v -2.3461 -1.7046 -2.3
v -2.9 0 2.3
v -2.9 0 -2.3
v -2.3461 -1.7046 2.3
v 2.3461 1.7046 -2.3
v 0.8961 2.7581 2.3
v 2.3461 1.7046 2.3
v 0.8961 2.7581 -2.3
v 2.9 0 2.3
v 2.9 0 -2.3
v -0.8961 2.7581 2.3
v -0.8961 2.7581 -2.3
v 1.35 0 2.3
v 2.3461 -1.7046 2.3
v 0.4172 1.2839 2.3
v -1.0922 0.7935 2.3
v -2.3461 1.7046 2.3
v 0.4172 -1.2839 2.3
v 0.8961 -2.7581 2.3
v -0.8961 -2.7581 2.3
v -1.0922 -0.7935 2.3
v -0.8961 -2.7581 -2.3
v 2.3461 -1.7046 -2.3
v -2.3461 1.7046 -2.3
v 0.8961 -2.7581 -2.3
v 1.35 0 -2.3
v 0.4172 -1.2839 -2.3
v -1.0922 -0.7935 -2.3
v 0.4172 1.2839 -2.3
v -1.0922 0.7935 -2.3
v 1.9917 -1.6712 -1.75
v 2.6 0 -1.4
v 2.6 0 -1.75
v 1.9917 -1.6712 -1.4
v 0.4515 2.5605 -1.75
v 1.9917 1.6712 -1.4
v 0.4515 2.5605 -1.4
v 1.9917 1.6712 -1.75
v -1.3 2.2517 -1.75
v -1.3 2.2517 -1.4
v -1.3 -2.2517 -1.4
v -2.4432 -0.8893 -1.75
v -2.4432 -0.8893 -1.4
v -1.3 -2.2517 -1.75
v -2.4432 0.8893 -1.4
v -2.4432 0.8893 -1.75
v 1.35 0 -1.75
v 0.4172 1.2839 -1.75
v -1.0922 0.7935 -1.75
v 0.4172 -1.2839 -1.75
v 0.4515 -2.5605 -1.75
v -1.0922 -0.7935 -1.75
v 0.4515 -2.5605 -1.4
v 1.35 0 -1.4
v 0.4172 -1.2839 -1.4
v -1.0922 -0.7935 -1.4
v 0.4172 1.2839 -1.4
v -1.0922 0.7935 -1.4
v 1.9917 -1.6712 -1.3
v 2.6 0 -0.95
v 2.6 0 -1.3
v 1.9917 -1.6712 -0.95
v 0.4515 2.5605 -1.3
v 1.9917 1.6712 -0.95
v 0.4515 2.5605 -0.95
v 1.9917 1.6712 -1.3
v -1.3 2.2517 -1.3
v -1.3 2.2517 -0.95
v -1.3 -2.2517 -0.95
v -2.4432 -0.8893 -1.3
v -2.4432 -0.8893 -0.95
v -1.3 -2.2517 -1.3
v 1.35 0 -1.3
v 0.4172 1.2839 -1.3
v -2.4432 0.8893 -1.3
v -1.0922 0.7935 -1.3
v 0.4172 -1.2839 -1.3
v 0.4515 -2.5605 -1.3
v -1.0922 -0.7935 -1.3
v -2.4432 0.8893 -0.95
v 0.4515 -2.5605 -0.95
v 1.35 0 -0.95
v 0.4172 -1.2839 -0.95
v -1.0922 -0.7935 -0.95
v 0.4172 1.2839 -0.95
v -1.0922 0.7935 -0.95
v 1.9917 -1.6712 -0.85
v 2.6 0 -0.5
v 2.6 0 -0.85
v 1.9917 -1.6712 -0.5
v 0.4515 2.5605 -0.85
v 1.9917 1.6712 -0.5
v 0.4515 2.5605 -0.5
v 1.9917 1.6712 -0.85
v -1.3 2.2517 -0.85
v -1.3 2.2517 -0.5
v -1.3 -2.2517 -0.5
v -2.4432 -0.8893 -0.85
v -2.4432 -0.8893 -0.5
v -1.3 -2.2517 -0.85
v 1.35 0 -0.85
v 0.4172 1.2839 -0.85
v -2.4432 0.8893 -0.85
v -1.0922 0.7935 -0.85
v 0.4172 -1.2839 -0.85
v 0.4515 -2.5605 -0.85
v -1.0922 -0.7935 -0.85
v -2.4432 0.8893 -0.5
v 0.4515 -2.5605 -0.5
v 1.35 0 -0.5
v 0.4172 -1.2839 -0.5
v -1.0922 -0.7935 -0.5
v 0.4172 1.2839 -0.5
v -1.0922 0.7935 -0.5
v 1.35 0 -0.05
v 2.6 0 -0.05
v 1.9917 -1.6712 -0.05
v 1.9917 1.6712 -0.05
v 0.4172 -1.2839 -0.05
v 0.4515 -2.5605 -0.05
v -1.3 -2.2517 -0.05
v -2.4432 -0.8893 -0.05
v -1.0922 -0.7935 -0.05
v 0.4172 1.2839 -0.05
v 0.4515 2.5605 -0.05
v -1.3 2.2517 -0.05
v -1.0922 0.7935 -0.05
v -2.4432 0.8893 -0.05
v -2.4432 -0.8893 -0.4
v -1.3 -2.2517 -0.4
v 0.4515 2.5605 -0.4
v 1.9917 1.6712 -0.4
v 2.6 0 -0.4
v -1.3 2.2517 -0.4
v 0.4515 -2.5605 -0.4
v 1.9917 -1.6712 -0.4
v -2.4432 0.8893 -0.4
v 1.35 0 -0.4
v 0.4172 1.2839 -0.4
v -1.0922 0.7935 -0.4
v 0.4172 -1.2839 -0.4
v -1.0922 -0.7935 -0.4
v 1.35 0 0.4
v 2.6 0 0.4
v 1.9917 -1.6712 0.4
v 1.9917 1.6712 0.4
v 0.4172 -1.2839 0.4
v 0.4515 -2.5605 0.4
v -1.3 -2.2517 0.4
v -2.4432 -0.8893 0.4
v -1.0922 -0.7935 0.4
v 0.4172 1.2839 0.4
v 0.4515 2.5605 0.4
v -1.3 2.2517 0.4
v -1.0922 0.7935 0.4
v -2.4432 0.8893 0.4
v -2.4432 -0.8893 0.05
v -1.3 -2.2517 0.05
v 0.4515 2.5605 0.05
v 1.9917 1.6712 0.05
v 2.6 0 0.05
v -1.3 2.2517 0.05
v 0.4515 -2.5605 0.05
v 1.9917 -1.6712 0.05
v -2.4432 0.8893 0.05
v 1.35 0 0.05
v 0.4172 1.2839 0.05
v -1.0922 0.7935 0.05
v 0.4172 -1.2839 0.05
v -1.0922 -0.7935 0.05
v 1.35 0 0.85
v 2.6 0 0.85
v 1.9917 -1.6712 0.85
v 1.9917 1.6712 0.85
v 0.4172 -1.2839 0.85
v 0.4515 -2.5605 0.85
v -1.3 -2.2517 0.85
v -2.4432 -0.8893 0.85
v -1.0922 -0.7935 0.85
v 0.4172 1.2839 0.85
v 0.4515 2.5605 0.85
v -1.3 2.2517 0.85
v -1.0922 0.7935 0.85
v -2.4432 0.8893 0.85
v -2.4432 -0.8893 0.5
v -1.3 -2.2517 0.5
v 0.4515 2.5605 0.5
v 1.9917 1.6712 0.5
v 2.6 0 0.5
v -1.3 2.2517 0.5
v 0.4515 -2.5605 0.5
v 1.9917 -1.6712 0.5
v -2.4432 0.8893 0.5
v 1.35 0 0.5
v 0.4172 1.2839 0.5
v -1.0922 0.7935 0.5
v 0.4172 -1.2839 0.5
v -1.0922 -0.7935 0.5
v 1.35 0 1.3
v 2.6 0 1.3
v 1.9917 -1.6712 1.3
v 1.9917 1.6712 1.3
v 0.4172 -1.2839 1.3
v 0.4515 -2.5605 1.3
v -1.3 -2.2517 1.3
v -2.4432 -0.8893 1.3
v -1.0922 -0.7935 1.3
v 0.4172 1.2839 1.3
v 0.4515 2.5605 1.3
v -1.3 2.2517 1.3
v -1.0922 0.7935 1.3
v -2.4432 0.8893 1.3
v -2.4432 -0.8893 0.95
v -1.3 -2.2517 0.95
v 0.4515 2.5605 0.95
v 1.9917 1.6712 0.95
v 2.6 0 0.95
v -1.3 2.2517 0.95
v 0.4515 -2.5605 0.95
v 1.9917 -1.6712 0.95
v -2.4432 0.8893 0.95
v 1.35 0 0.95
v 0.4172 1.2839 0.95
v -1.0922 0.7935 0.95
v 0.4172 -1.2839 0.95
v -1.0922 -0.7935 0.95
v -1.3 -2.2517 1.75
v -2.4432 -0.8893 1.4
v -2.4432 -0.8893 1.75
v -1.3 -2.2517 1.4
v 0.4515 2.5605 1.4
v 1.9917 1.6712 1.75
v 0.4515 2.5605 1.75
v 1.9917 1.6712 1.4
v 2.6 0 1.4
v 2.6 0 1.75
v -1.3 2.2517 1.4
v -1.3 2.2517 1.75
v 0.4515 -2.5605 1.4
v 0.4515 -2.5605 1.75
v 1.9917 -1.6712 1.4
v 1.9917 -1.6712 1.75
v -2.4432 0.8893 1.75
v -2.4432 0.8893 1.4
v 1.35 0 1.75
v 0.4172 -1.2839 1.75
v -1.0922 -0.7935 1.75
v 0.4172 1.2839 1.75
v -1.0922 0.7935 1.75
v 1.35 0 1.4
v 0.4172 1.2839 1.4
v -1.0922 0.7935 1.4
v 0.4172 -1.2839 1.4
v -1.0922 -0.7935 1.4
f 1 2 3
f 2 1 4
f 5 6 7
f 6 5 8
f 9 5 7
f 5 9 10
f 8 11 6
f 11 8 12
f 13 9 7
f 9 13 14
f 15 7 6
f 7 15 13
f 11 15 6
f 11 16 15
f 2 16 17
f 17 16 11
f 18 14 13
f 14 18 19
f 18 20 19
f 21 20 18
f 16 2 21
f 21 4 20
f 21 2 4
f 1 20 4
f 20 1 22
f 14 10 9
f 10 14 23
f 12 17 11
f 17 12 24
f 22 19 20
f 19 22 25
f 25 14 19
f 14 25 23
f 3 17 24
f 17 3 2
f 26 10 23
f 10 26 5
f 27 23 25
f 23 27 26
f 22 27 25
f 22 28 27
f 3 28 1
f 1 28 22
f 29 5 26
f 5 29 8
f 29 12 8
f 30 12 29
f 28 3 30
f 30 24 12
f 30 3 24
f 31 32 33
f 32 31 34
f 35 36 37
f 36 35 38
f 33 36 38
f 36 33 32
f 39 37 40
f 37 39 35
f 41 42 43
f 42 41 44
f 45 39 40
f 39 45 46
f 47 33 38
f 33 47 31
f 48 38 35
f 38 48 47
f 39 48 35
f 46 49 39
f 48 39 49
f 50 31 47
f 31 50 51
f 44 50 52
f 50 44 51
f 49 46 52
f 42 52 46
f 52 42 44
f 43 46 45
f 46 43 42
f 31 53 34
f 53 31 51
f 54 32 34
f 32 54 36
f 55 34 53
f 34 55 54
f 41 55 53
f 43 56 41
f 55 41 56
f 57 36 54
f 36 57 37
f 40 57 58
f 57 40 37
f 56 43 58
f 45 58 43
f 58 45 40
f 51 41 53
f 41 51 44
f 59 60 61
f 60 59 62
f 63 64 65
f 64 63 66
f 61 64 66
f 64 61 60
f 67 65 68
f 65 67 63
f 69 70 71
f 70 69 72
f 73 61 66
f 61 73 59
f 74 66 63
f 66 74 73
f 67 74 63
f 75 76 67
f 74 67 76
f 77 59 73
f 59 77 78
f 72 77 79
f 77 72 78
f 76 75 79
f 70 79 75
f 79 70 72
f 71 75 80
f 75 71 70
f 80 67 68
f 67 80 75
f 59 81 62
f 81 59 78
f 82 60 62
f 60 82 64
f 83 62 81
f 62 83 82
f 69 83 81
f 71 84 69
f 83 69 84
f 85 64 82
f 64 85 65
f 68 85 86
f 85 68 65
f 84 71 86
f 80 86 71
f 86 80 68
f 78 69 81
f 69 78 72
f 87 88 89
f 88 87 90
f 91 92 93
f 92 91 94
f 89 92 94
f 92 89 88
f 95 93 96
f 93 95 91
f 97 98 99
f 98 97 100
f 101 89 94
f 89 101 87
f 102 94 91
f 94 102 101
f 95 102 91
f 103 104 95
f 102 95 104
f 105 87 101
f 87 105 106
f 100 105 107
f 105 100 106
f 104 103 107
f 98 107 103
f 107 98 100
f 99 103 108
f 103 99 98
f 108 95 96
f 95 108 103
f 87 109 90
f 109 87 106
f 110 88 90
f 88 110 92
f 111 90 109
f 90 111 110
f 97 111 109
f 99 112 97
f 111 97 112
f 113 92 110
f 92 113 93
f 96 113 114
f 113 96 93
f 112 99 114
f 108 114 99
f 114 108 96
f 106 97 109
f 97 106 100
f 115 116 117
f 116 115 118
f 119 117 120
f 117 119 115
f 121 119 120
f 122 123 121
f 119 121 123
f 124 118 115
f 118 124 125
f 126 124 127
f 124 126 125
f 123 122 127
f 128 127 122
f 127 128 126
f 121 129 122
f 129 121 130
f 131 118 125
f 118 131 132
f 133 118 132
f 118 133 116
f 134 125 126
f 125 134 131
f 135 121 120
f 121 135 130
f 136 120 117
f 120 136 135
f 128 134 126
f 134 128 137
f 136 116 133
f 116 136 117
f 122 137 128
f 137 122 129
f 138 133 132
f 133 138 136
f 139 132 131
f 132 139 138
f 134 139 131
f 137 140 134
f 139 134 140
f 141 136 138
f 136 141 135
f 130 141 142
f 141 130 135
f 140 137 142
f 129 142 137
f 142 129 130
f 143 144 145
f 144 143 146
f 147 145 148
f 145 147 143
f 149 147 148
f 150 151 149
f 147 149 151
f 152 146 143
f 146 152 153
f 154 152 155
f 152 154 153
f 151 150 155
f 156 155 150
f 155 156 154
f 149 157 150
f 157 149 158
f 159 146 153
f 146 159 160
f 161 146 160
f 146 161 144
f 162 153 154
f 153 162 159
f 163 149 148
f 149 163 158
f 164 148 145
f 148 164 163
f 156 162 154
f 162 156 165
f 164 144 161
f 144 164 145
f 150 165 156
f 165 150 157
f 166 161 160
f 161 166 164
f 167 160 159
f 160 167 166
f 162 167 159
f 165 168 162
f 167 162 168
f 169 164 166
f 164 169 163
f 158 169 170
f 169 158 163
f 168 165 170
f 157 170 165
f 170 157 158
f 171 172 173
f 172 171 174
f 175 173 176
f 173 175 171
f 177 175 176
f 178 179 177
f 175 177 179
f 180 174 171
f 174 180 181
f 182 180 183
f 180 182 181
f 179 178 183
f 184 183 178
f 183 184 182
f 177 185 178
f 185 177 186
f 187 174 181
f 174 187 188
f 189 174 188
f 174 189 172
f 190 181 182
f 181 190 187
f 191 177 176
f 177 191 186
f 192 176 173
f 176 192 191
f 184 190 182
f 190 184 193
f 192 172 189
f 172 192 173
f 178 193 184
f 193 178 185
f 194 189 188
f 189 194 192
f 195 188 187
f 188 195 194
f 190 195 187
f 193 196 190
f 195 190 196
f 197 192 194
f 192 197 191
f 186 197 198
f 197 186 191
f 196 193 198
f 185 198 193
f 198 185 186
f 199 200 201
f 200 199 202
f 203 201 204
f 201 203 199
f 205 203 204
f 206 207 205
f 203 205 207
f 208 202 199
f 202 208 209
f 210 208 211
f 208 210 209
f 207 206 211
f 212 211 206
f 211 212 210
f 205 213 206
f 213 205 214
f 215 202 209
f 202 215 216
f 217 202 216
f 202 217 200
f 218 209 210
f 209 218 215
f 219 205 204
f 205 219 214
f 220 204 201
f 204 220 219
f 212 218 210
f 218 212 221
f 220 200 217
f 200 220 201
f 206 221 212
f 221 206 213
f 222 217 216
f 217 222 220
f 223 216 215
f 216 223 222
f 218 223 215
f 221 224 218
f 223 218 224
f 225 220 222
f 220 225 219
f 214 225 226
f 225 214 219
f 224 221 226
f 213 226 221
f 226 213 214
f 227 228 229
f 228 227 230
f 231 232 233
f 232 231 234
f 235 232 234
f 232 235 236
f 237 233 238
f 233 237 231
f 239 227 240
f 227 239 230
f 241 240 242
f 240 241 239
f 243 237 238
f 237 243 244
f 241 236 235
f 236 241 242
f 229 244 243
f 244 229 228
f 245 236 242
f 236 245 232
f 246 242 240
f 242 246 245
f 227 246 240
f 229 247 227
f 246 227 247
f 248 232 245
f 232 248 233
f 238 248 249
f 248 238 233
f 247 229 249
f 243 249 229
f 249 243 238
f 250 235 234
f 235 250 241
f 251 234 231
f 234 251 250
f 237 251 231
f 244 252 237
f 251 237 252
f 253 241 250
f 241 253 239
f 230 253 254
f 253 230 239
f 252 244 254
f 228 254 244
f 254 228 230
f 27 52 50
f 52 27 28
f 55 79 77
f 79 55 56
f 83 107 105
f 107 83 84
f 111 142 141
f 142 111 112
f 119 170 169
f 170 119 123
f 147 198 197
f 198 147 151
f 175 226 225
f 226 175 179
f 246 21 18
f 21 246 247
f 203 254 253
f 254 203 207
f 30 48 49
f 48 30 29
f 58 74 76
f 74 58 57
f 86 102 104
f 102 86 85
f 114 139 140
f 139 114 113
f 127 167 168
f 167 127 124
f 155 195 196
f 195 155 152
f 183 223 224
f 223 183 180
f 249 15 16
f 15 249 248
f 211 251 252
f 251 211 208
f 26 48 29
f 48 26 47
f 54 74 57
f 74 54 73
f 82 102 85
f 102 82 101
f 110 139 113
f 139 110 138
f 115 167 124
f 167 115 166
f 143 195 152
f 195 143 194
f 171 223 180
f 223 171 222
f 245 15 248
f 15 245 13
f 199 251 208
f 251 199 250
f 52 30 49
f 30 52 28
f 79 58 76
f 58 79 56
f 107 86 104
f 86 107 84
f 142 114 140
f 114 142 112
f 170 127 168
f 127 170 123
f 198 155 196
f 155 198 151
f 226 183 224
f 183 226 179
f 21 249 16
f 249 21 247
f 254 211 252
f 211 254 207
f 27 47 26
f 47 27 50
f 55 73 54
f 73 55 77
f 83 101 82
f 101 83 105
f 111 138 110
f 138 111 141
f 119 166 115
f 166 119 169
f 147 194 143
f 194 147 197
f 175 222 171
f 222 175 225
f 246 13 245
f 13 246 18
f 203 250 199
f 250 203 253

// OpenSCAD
// Parameters
outer_diameter = 5.8; //[2.9:11.6:0.1]
length = 4.6; //[2.3:9.2:0.1]
screw_diameter = 2.5; //[1.25:5:0.05]
inner_thread_pitch = 0.45; //[0.2:0.9:0.01]
internal_thread_depth = 4.6; //[2.3:9.2:0.1]
end_chamfer = 0.3; //[0.15:0.6:0.05]
external_knurl_depth = 0.3; //[0.15:0.6:0.05]
knurl_count = 8; //[4:16:1]
knurl_groove_width = 0.35; //[0.2:0.7:0.05]
knurl_margin = 0.5; //[0.25:1:0.05]
bore_clearance = 0.2; //[0.05:0.4:0.05]
overlap = 0.8; //[0.5:2:0.1]

// Threaded Insert - complete geometry
module threaded_insert() {
  color("Brass") {
    difference() {
      // Insert body with chamfers
      union() {
        // Main cylindrical body
        cylinder(r=outer_diameter/2, h=length, center=true);
        
        // Lead-in chamfers
        translate([0, 0, length/2 - end_chamfer/2])
          cylinder(r1=outer_diameter/2, r2=outer_diameter/2 - end_chamfer, h=end_chamfer, center=true);
        translate([0, 0, -length/2 + end_chamfer/2])
          cylinder(r1=outer_diameter/2 - end_chamfer, r2=outer_diameter/2, h=end_chamfer, center=true);
      }
      
      // External knurling profile
      for (i = [0:knurl_count-1]) {
        translate([0, 0, -length/2 + knurl_margin + (i + 0.5) * (length - 2 * knurl_margin) / knurl_count])
          cylinder(r=outer_diameter/2 - external_knurl_depth, h=knurl_groove_width, center=true);
      }
      
      // Internal screw bore
      cylinder(r=(screw_diameter + bore_clearance)/2, h=internal_thread_depth + 2*overlap, center=true);
    }
  }
}

// Assembly
module assembly() {
  threaded_insert();
}

assembly();
